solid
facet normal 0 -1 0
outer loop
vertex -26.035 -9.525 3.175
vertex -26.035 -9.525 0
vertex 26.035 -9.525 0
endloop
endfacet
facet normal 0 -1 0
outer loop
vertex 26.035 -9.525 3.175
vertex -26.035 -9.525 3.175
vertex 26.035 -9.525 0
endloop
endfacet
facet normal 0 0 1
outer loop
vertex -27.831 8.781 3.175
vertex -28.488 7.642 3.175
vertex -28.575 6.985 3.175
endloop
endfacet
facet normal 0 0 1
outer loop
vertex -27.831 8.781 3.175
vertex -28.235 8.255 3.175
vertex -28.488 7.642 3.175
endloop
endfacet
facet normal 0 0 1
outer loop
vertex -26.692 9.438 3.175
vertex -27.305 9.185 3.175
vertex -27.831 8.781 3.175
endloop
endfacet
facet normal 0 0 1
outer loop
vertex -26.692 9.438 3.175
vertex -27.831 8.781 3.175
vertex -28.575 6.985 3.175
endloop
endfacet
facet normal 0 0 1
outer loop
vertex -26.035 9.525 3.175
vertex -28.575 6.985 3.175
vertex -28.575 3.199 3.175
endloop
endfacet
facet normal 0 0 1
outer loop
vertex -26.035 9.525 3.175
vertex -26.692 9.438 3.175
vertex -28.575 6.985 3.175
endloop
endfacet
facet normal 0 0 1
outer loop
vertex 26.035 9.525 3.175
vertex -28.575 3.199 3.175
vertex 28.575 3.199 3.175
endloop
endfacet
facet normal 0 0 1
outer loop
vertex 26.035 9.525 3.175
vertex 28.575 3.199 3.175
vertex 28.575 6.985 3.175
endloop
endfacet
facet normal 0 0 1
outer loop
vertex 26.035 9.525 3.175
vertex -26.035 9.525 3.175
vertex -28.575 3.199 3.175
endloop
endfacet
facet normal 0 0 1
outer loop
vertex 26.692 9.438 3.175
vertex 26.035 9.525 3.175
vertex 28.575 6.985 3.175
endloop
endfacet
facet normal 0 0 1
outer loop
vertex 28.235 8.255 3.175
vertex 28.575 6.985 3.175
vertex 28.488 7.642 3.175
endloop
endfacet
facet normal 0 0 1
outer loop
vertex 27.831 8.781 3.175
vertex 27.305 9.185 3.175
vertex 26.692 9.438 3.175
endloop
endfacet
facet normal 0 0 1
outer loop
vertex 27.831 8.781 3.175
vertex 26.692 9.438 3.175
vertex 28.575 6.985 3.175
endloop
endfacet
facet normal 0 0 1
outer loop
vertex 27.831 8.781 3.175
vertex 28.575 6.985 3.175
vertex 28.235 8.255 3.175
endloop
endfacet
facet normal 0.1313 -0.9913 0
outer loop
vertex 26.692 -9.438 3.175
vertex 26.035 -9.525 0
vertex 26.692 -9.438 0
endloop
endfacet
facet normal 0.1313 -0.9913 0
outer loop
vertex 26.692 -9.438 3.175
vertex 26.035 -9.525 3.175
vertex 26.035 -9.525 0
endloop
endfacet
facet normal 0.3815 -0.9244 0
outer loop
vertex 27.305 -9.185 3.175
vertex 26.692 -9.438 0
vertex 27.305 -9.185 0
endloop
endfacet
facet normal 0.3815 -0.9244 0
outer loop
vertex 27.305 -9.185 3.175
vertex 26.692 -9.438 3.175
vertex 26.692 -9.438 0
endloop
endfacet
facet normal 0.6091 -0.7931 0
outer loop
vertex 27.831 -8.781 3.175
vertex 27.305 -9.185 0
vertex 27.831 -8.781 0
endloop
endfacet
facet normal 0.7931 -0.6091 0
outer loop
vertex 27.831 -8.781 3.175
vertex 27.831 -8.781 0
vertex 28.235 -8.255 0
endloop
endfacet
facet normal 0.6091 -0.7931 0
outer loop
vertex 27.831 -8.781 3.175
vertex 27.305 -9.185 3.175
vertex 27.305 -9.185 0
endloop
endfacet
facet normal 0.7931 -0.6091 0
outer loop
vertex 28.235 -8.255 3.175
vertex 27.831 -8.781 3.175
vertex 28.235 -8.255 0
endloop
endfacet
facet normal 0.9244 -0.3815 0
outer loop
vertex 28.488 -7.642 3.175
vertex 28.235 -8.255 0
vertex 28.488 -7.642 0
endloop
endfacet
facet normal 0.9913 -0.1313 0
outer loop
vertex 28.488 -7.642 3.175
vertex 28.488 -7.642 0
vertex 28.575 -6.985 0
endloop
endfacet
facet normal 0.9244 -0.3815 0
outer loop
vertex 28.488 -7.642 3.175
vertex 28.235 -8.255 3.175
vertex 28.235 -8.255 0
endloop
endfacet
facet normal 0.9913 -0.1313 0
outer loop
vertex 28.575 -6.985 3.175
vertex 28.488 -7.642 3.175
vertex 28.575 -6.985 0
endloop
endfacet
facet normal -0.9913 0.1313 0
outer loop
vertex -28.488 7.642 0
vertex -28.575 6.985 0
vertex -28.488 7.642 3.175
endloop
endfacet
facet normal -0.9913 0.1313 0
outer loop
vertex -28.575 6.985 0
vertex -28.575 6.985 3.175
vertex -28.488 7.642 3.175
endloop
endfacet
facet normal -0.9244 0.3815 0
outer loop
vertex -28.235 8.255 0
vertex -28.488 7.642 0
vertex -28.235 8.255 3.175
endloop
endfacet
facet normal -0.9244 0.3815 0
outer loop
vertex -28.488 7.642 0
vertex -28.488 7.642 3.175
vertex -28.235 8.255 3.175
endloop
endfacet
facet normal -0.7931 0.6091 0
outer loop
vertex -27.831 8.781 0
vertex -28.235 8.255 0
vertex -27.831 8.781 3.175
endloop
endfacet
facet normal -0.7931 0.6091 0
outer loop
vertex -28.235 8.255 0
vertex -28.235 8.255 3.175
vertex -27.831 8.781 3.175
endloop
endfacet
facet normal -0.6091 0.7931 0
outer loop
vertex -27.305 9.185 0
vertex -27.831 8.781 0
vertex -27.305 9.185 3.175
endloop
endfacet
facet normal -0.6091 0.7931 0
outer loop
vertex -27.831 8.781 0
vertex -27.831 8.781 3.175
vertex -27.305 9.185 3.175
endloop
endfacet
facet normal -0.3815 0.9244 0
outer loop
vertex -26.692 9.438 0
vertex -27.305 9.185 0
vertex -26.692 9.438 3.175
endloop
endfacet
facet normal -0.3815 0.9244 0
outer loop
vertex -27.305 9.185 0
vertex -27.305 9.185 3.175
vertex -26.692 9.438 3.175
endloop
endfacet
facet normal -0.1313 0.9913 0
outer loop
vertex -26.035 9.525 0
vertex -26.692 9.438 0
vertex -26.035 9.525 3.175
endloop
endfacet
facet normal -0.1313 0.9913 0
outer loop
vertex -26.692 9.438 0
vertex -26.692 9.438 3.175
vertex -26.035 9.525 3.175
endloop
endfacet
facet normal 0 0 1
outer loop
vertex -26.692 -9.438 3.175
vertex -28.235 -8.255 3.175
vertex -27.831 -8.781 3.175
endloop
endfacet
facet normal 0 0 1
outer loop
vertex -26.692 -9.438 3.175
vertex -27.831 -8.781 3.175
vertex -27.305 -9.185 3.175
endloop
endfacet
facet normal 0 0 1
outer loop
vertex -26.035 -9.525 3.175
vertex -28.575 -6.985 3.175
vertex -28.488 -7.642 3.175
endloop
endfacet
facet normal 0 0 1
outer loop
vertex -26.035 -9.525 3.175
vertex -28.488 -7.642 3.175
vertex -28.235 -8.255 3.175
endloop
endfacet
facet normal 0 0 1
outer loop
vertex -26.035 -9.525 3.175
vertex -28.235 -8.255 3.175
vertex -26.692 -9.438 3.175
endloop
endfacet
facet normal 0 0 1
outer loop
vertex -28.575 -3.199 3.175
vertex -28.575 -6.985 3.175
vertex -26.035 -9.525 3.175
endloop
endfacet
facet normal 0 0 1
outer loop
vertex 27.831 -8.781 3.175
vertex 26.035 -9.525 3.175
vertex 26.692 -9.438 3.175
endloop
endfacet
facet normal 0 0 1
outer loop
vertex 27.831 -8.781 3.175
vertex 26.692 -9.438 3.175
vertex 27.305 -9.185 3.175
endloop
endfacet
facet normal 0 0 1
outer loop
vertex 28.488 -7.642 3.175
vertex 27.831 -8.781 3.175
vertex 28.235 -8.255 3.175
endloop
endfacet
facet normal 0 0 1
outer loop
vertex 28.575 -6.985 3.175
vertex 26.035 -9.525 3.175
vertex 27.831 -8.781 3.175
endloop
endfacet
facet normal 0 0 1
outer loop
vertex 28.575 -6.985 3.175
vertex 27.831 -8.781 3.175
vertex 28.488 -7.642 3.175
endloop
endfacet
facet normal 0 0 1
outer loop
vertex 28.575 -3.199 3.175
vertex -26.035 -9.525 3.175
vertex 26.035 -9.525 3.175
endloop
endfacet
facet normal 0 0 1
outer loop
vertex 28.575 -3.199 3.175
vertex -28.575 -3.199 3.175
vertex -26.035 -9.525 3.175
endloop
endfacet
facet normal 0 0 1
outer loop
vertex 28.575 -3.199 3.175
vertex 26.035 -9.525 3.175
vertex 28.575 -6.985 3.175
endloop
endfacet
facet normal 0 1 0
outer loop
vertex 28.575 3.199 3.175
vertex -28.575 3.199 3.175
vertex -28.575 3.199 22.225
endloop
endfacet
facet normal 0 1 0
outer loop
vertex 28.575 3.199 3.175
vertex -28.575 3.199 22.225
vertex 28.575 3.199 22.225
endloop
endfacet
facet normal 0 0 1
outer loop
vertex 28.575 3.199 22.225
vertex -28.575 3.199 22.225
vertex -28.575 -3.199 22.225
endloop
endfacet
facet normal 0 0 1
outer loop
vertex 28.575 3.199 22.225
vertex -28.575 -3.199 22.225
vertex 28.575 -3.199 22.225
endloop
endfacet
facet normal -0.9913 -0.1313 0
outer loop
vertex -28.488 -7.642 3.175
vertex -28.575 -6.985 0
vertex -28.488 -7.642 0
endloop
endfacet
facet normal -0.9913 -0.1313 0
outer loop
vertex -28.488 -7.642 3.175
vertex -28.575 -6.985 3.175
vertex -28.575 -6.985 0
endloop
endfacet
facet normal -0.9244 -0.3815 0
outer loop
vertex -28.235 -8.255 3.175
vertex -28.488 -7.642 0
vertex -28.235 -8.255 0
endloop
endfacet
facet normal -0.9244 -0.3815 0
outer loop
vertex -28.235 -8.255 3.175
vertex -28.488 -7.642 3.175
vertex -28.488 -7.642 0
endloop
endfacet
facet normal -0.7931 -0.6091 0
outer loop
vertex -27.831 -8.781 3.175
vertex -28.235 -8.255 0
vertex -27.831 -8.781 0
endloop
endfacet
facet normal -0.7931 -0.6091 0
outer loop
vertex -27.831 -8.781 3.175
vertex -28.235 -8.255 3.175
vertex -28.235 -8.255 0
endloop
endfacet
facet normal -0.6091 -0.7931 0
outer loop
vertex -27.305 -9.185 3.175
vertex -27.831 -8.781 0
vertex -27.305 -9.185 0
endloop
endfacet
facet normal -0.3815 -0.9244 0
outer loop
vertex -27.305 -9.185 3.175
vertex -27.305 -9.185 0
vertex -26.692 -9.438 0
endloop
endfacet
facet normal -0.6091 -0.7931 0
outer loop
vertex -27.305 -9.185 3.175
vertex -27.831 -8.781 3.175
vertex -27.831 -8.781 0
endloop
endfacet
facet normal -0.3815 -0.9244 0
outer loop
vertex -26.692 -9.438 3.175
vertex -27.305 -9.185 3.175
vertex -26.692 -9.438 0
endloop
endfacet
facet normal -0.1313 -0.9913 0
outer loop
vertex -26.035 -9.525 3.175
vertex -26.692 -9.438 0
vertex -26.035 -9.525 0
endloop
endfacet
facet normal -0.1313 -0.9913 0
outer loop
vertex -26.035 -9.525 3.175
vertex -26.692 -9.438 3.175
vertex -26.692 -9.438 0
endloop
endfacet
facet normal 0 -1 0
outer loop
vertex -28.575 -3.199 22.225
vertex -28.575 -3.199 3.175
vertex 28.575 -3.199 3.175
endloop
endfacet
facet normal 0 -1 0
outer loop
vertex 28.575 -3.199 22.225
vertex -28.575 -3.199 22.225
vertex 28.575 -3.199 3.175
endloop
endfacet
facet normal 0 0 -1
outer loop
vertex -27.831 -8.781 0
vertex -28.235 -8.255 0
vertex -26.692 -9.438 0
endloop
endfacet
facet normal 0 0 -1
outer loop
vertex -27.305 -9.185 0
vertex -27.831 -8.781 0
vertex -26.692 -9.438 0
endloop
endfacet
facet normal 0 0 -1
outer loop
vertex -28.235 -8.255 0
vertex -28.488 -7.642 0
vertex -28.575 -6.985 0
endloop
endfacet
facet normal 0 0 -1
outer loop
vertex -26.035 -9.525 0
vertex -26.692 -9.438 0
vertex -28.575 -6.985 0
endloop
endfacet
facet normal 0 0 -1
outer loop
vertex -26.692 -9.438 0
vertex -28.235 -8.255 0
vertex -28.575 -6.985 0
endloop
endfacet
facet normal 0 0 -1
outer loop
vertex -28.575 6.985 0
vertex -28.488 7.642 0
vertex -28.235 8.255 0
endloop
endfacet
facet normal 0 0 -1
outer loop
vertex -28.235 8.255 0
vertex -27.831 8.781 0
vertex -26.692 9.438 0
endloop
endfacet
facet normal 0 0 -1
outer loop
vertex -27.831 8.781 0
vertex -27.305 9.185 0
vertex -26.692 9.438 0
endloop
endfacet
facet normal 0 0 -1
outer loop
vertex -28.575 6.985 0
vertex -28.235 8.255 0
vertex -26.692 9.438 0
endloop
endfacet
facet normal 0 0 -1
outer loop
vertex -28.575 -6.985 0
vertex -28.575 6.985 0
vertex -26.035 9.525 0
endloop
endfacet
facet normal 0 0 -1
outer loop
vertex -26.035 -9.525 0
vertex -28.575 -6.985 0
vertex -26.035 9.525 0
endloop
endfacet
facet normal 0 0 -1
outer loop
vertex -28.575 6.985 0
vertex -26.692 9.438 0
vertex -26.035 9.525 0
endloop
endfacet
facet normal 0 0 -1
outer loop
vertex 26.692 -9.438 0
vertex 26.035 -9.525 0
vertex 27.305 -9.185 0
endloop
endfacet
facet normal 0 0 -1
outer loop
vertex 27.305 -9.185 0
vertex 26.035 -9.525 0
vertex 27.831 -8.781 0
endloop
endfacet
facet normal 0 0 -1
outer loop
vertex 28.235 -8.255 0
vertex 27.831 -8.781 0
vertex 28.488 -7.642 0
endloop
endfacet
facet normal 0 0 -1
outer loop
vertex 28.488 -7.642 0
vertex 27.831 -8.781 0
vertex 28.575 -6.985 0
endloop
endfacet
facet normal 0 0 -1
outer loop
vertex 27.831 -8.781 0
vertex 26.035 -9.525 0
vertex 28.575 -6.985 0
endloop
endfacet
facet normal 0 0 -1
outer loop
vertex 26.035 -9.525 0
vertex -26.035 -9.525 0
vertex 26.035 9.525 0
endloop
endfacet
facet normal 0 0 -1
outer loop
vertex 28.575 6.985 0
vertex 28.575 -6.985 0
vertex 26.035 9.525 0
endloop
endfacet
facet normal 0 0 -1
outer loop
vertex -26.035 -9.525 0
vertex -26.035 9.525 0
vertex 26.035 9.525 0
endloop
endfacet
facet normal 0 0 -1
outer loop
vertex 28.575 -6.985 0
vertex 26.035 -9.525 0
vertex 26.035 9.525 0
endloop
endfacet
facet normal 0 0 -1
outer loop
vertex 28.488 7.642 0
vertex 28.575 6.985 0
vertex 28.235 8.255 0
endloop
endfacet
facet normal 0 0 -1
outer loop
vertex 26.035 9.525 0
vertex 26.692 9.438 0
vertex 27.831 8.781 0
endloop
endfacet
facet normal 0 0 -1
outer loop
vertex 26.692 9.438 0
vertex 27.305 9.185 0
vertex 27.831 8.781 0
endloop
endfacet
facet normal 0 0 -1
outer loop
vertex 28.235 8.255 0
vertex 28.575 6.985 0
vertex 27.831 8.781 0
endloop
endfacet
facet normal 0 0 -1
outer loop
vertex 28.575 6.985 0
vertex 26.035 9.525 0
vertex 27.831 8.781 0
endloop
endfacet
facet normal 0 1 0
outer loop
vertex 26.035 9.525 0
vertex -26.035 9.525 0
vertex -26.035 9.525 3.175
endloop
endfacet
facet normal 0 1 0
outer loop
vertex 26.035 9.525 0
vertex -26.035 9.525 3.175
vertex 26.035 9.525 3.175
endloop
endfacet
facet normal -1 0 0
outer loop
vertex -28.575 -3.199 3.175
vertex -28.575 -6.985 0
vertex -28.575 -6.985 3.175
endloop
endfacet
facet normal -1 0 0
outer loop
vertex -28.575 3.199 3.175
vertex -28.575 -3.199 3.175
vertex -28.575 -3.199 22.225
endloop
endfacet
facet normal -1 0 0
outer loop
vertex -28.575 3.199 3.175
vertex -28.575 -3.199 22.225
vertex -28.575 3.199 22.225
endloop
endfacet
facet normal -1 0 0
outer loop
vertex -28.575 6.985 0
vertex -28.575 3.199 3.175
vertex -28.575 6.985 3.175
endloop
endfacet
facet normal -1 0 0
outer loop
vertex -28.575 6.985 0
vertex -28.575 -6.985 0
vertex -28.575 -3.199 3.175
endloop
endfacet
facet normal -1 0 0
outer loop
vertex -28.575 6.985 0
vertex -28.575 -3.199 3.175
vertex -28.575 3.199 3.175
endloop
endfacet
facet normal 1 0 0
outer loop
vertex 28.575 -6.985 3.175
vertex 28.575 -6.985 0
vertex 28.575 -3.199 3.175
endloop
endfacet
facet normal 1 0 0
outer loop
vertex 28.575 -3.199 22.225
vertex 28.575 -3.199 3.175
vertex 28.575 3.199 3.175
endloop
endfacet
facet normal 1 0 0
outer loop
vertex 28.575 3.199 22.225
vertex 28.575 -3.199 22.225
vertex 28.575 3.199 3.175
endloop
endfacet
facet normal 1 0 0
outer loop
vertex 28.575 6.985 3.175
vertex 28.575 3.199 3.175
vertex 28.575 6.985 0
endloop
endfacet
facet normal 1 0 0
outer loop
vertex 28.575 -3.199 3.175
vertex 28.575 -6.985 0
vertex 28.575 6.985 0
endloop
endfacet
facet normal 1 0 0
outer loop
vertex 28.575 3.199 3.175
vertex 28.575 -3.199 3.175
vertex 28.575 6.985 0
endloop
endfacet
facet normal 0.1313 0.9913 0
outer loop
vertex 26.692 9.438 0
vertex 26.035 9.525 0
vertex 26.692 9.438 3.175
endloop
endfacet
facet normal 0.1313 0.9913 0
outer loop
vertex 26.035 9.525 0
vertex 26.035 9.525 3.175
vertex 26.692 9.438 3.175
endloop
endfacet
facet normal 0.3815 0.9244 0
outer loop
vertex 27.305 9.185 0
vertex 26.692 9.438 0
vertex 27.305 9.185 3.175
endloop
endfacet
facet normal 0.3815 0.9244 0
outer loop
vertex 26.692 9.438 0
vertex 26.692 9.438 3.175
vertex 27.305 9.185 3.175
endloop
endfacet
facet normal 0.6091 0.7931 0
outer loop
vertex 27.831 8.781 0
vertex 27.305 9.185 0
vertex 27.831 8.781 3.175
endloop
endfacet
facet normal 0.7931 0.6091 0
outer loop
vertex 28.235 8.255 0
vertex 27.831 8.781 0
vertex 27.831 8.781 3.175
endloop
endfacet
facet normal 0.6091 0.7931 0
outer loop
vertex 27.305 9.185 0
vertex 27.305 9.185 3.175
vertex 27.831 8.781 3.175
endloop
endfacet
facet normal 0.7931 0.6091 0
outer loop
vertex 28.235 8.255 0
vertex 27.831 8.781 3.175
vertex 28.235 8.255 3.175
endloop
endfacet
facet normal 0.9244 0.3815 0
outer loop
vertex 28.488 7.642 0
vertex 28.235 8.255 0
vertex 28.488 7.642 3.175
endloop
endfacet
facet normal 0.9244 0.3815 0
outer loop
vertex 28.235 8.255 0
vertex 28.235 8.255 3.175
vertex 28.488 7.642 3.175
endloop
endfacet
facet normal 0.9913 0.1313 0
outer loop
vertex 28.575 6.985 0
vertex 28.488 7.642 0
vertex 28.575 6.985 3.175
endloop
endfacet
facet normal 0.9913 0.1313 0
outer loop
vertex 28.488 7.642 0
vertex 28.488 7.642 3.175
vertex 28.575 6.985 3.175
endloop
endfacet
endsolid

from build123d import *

# Parameters (mm, degrees)
SKETCH1_W           = 57.15
SKETCH1_H           = 19.05
BOSS_EXTRUDE1_DEPTH = 3.175
SKETCH2_W           = 57.15
SKETCH2_H           = 6.398717948
BOSS_EXTRUDE2_DEPTH = 19.05
FILLET1_R           = 2.54


with BuildPart() as part:
    # Sketch1 → Boss-Extrude1 (new body)
    with BuildSketch(Plane.XY):
        Rectangle(SKETCH1_W, SKETCH1_H)
    extrude(amount=BOSS_EXTRUDE1_DEPTH)

    # Sketch2 → Boss-Extrude2 (add)
    with BuildSketch(Plane.XY.offset(3.175)):
        Rectangle(SKETCH2_W, SKETCH2_H)
    extrude(amount=BOSS_EXTRUDE2_DEPTH)

    # Fillet1
    fillet1_edges = [part.edges().sort_by_distance(p)[0] for p in [
        (28.575, -9.525, 1.5875),
        (-28.575, -9.525, 1.5875),
        (-28.575, 9.525, 1.5875),
        (28.575, 9.525, 1.5875),
    ]]
    fillet(fillet1_edges, radius=FILLET1_R)


solid = part.part
